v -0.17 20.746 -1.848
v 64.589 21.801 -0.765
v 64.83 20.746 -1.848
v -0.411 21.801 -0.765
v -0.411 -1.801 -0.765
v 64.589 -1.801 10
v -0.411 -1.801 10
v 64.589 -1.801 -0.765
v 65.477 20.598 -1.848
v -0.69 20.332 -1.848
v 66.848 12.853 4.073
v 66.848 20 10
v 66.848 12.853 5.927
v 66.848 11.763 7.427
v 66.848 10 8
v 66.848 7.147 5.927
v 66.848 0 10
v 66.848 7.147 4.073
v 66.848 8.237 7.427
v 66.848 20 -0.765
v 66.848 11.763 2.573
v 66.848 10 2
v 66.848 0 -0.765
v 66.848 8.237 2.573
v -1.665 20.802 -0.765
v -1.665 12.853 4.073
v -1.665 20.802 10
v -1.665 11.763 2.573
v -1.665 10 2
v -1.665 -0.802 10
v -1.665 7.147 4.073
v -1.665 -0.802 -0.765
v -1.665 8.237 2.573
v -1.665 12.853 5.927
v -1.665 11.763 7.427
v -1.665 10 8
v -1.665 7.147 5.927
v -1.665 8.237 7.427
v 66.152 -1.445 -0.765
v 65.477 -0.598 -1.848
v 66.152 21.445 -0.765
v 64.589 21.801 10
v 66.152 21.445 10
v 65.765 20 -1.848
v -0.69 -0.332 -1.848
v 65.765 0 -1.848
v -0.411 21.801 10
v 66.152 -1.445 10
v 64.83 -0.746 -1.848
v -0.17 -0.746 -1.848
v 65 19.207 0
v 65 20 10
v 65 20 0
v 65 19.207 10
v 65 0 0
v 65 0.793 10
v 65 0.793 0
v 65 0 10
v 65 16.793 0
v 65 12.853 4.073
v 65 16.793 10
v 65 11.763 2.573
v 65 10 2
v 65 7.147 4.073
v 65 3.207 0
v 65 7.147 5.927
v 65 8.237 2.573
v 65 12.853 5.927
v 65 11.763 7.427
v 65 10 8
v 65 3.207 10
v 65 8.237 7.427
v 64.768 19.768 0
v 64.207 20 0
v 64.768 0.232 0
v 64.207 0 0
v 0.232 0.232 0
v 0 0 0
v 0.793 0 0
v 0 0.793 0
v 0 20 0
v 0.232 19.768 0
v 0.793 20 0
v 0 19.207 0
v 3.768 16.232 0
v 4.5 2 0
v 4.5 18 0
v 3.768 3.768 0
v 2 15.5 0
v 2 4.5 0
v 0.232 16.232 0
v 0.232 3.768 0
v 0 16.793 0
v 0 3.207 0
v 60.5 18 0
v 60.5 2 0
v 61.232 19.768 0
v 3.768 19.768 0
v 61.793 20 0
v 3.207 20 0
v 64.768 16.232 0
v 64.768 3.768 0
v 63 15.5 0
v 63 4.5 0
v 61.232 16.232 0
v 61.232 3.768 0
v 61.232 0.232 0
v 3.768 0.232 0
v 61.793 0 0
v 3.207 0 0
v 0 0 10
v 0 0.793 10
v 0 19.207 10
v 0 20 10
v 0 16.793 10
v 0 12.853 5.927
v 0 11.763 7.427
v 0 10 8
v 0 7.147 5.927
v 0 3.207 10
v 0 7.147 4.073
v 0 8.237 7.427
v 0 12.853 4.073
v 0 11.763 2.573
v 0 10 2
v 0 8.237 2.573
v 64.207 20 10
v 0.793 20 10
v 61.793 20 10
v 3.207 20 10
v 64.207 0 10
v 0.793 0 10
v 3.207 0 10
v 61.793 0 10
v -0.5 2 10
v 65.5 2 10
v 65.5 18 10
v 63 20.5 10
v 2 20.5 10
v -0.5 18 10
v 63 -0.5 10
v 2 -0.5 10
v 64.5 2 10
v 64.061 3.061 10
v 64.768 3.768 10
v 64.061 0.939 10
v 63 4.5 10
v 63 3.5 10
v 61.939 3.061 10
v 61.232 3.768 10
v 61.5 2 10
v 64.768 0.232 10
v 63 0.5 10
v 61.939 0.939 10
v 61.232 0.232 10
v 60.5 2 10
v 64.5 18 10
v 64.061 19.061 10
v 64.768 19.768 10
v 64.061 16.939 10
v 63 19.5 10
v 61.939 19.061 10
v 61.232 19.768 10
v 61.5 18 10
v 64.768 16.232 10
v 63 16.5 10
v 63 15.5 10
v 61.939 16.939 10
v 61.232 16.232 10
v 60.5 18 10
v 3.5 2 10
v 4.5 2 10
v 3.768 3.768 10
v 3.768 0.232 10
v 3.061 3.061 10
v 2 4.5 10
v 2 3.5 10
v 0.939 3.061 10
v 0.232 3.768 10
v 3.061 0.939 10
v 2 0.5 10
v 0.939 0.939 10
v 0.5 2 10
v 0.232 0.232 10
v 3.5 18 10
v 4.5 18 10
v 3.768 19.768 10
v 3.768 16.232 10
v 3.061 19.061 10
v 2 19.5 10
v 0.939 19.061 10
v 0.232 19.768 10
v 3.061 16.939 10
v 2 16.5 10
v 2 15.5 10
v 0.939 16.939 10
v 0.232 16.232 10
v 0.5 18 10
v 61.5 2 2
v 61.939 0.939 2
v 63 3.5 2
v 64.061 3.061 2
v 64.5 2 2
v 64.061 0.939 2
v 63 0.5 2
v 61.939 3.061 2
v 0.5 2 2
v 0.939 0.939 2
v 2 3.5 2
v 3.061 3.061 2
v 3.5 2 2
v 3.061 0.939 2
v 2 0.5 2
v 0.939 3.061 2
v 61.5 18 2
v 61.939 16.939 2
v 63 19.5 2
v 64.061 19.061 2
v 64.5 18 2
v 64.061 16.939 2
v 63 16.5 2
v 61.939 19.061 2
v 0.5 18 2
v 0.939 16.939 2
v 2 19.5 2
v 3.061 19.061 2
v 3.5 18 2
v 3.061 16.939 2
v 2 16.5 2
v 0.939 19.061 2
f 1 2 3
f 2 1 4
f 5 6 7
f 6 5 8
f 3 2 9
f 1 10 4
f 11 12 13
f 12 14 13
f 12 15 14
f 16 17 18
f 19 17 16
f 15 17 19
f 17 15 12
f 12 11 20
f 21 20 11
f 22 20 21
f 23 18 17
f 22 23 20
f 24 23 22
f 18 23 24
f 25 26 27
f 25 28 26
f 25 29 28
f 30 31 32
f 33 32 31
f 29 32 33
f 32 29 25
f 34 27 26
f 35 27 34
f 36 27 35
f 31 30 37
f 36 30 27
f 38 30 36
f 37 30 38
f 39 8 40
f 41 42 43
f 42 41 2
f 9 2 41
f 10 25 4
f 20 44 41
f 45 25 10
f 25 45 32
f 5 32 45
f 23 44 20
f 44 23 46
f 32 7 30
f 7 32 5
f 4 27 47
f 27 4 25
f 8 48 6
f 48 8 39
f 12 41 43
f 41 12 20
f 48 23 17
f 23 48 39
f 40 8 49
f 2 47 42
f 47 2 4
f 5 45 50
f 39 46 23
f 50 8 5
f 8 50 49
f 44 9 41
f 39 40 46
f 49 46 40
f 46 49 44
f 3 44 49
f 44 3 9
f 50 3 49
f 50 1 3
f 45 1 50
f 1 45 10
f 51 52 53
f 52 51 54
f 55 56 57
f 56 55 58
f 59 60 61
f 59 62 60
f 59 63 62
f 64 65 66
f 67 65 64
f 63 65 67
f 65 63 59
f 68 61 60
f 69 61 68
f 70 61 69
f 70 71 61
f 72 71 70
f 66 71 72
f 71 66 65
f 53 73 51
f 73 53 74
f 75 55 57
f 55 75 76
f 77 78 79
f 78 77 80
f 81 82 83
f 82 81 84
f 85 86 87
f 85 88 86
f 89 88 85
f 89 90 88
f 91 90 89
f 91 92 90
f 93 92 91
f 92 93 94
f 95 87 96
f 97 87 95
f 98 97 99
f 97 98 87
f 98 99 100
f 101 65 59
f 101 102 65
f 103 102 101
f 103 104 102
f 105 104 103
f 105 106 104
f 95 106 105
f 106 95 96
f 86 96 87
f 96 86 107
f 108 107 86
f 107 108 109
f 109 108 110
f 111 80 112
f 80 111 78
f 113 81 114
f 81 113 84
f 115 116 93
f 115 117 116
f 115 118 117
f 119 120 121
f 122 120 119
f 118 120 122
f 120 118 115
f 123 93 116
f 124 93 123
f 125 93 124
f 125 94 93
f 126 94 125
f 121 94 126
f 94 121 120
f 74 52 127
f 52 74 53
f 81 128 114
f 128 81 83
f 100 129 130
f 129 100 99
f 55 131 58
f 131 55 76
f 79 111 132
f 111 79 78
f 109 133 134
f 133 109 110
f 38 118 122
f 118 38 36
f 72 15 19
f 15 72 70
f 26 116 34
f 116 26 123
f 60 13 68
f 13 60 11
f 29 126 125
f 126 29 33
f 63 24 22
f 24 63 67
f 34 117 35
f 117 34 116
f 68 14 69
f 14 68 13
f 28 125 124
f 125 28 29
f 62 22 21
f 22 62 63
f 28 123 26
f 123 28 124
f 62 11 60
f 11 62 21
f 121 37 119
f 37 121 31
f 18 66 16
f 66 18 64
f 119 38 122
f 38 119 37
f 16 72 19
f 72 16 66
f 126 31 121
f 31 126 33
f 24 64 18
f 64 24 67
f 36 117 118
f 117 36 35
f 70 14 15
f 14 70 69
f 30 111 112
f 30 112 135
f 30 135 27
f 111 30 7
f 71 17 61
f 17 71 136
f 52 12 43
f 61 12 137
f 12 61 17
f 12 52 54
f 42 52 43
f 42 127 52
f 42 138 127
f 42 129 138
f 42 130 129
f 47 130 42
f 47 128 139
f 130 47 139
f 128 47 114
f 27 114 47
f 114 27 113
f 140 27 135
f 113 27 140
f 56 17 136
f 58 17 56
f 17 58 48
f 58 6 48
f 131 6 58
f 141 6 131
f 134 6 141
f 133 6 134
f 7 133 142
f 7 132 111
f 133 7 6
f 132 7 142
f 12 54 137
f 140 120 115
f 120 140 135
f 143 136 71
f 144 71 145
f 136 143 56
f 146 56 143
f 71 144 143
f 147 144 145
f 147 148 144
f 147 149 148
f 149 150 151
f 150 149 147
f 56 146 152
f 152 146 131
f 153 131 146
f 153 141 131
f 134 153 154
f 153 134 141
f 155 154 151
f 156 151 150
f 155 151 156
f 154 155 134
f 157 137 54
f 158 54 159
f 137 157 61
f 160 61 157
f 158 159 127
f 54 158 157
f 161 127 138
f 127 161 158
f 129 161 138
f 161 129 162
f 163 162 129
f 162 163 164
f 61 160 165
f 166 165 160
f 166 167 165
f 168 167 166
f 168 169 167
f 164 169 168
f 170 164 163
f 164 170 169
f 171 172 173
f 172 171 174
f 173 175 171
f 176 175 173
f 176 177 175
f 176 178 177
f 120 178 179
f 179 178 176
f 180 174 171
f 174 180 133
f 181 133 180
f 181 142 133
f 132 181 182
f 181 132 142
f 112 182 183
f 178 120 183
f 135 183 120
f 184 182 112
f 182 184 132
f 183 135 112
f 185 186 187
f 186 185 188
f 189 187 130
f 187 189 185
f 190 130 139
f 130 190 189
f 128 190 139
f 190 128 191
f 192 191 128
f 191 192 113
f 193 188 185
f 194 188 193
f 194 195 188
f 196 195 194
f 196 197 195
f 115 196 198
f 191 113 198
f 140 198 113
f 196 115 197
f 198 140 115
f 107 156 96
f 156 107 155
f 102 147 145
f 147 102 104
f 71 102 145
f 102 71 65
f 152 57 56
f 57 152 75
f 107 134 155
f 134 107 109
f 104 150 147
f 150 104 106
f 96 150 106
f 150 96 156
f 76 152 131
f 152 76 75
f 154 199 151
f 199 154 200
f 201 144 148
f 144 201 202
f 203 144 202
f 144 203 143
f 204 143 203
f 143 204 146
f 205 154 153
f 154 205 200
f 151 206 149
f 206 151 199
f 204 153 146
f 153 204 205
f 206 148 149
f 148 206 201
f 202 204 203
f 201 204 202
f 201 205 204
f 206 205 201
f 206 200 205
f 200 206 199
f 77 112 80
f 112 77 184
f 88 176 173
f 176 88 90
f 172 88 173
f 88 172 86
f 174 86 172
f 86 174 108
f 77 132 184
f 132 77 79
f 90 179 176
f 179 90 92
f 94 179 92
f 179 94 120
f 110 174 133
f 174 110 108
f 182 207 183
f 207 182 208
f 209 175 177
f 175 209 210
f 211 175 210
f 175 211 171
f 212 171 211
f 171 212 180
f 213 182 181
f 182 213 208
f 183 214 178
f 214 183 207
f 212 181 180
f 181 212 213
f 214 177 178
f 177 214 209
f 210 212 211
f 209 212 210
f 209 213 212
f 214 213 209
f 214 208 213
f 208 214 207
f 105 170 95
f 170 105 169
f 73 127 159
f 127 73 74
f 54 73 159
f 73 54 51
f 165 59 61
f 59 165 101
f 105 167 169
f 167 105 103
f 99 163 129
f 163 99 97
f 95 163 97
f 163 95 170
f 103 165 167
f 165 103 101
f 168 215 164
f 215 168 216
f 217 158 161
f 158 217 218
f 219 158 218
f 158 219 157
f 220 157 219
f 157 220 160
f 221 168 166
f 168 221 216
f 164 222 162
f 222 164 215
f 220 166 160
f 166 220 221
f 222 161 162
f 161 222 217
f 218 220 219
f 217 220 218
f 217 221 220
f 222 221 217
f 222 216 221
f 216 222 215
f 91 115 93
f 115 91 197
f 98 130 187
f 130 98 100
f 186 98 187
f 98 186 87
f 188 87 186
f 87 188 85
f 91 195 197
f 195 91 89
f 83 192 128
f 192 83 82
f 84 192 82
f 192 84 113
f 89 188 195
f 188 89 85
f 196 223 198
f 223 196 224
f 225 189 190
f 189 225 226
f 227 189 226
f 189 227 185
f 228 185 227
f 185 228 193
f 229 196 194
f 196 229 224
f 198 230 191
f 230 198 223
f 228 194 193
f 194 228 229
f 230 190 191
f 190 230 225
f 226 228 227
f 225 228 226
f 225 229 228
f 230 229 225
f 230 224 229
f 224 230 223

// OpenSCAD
box_length = 65;
box_width = 20;
box_height = 10;

show_box = true;
show_head = false;

module box(){
difference(){
    minkowski(){
        cube([box_length,box_width,box_height]);
        sphere(r = 2);
    }
    cube([box_length,box_width,box_height * 2]);
    rotate([0,90,0])
    translate([- box_height / 2,box_width / 2,0])
    cylinder(r = 3, h= 200, center = true);
    
    translate([-50,-50, box_height])
    cube([200,200,100]);
}

translate([(box_length - 60) / 2,(box_width - 10) / 2,(box_height - 5) / 2])
%cube([60,10,5]);

translate([2,2,0])
for (i = [0,1,2,3]){
   translate((i % 2) == 0 ? [box_length - 4,0,0] : [0,0,0]){
   translate((i >= 2) ? [0,box_width - 4,0] : [0,0,0])
   screw_mount(outer= 2.5, inner= 1.5);}
}
}

module screw_mount(outer, inner){

difference(){
cylinder(h= box_height, r= outer);
translate([0,0,box_height / 5])    
cylinder(h= box_height + 1, r= inner, $fn=8);   
}    

}

module head(){
  difference(){
    minkowski(){
        translate([0,0,-1])
        cube([box_length,box_width,1]);
        sphere(r = 2);
    }
    
    translate([-50,-50, -100])
    cube([200,200,100]);
    
    translate([0,box_width / 4, -99])
    cube([box_length,box_width / 2,100]);
    
    translate([box_length / 6,box_width / 8,-99])
    cube([box_length * 4 / 6,box_width * 6 / 8,100]);
    
    translate([2,2,0])
    for (i = [0,1,2,3]){
       translate((i % 2) == 0 ? [box_length - 4,0,0] : [0,0,0]){
       translate((i >= 2) ? [0,box_width - 4,0] : [0,0,0]){
           translate([0,0,0.5])
       cylinder(r = 2.5, h = 20, center= false, $fn= 20);
       cylinder(r = 1.5, h = 20, center= true, $fn= 20);}}
    }
}  
}

if (show_box){
    box();
}

if (show_head){
translate([0,0,box_height])
head();    
}
